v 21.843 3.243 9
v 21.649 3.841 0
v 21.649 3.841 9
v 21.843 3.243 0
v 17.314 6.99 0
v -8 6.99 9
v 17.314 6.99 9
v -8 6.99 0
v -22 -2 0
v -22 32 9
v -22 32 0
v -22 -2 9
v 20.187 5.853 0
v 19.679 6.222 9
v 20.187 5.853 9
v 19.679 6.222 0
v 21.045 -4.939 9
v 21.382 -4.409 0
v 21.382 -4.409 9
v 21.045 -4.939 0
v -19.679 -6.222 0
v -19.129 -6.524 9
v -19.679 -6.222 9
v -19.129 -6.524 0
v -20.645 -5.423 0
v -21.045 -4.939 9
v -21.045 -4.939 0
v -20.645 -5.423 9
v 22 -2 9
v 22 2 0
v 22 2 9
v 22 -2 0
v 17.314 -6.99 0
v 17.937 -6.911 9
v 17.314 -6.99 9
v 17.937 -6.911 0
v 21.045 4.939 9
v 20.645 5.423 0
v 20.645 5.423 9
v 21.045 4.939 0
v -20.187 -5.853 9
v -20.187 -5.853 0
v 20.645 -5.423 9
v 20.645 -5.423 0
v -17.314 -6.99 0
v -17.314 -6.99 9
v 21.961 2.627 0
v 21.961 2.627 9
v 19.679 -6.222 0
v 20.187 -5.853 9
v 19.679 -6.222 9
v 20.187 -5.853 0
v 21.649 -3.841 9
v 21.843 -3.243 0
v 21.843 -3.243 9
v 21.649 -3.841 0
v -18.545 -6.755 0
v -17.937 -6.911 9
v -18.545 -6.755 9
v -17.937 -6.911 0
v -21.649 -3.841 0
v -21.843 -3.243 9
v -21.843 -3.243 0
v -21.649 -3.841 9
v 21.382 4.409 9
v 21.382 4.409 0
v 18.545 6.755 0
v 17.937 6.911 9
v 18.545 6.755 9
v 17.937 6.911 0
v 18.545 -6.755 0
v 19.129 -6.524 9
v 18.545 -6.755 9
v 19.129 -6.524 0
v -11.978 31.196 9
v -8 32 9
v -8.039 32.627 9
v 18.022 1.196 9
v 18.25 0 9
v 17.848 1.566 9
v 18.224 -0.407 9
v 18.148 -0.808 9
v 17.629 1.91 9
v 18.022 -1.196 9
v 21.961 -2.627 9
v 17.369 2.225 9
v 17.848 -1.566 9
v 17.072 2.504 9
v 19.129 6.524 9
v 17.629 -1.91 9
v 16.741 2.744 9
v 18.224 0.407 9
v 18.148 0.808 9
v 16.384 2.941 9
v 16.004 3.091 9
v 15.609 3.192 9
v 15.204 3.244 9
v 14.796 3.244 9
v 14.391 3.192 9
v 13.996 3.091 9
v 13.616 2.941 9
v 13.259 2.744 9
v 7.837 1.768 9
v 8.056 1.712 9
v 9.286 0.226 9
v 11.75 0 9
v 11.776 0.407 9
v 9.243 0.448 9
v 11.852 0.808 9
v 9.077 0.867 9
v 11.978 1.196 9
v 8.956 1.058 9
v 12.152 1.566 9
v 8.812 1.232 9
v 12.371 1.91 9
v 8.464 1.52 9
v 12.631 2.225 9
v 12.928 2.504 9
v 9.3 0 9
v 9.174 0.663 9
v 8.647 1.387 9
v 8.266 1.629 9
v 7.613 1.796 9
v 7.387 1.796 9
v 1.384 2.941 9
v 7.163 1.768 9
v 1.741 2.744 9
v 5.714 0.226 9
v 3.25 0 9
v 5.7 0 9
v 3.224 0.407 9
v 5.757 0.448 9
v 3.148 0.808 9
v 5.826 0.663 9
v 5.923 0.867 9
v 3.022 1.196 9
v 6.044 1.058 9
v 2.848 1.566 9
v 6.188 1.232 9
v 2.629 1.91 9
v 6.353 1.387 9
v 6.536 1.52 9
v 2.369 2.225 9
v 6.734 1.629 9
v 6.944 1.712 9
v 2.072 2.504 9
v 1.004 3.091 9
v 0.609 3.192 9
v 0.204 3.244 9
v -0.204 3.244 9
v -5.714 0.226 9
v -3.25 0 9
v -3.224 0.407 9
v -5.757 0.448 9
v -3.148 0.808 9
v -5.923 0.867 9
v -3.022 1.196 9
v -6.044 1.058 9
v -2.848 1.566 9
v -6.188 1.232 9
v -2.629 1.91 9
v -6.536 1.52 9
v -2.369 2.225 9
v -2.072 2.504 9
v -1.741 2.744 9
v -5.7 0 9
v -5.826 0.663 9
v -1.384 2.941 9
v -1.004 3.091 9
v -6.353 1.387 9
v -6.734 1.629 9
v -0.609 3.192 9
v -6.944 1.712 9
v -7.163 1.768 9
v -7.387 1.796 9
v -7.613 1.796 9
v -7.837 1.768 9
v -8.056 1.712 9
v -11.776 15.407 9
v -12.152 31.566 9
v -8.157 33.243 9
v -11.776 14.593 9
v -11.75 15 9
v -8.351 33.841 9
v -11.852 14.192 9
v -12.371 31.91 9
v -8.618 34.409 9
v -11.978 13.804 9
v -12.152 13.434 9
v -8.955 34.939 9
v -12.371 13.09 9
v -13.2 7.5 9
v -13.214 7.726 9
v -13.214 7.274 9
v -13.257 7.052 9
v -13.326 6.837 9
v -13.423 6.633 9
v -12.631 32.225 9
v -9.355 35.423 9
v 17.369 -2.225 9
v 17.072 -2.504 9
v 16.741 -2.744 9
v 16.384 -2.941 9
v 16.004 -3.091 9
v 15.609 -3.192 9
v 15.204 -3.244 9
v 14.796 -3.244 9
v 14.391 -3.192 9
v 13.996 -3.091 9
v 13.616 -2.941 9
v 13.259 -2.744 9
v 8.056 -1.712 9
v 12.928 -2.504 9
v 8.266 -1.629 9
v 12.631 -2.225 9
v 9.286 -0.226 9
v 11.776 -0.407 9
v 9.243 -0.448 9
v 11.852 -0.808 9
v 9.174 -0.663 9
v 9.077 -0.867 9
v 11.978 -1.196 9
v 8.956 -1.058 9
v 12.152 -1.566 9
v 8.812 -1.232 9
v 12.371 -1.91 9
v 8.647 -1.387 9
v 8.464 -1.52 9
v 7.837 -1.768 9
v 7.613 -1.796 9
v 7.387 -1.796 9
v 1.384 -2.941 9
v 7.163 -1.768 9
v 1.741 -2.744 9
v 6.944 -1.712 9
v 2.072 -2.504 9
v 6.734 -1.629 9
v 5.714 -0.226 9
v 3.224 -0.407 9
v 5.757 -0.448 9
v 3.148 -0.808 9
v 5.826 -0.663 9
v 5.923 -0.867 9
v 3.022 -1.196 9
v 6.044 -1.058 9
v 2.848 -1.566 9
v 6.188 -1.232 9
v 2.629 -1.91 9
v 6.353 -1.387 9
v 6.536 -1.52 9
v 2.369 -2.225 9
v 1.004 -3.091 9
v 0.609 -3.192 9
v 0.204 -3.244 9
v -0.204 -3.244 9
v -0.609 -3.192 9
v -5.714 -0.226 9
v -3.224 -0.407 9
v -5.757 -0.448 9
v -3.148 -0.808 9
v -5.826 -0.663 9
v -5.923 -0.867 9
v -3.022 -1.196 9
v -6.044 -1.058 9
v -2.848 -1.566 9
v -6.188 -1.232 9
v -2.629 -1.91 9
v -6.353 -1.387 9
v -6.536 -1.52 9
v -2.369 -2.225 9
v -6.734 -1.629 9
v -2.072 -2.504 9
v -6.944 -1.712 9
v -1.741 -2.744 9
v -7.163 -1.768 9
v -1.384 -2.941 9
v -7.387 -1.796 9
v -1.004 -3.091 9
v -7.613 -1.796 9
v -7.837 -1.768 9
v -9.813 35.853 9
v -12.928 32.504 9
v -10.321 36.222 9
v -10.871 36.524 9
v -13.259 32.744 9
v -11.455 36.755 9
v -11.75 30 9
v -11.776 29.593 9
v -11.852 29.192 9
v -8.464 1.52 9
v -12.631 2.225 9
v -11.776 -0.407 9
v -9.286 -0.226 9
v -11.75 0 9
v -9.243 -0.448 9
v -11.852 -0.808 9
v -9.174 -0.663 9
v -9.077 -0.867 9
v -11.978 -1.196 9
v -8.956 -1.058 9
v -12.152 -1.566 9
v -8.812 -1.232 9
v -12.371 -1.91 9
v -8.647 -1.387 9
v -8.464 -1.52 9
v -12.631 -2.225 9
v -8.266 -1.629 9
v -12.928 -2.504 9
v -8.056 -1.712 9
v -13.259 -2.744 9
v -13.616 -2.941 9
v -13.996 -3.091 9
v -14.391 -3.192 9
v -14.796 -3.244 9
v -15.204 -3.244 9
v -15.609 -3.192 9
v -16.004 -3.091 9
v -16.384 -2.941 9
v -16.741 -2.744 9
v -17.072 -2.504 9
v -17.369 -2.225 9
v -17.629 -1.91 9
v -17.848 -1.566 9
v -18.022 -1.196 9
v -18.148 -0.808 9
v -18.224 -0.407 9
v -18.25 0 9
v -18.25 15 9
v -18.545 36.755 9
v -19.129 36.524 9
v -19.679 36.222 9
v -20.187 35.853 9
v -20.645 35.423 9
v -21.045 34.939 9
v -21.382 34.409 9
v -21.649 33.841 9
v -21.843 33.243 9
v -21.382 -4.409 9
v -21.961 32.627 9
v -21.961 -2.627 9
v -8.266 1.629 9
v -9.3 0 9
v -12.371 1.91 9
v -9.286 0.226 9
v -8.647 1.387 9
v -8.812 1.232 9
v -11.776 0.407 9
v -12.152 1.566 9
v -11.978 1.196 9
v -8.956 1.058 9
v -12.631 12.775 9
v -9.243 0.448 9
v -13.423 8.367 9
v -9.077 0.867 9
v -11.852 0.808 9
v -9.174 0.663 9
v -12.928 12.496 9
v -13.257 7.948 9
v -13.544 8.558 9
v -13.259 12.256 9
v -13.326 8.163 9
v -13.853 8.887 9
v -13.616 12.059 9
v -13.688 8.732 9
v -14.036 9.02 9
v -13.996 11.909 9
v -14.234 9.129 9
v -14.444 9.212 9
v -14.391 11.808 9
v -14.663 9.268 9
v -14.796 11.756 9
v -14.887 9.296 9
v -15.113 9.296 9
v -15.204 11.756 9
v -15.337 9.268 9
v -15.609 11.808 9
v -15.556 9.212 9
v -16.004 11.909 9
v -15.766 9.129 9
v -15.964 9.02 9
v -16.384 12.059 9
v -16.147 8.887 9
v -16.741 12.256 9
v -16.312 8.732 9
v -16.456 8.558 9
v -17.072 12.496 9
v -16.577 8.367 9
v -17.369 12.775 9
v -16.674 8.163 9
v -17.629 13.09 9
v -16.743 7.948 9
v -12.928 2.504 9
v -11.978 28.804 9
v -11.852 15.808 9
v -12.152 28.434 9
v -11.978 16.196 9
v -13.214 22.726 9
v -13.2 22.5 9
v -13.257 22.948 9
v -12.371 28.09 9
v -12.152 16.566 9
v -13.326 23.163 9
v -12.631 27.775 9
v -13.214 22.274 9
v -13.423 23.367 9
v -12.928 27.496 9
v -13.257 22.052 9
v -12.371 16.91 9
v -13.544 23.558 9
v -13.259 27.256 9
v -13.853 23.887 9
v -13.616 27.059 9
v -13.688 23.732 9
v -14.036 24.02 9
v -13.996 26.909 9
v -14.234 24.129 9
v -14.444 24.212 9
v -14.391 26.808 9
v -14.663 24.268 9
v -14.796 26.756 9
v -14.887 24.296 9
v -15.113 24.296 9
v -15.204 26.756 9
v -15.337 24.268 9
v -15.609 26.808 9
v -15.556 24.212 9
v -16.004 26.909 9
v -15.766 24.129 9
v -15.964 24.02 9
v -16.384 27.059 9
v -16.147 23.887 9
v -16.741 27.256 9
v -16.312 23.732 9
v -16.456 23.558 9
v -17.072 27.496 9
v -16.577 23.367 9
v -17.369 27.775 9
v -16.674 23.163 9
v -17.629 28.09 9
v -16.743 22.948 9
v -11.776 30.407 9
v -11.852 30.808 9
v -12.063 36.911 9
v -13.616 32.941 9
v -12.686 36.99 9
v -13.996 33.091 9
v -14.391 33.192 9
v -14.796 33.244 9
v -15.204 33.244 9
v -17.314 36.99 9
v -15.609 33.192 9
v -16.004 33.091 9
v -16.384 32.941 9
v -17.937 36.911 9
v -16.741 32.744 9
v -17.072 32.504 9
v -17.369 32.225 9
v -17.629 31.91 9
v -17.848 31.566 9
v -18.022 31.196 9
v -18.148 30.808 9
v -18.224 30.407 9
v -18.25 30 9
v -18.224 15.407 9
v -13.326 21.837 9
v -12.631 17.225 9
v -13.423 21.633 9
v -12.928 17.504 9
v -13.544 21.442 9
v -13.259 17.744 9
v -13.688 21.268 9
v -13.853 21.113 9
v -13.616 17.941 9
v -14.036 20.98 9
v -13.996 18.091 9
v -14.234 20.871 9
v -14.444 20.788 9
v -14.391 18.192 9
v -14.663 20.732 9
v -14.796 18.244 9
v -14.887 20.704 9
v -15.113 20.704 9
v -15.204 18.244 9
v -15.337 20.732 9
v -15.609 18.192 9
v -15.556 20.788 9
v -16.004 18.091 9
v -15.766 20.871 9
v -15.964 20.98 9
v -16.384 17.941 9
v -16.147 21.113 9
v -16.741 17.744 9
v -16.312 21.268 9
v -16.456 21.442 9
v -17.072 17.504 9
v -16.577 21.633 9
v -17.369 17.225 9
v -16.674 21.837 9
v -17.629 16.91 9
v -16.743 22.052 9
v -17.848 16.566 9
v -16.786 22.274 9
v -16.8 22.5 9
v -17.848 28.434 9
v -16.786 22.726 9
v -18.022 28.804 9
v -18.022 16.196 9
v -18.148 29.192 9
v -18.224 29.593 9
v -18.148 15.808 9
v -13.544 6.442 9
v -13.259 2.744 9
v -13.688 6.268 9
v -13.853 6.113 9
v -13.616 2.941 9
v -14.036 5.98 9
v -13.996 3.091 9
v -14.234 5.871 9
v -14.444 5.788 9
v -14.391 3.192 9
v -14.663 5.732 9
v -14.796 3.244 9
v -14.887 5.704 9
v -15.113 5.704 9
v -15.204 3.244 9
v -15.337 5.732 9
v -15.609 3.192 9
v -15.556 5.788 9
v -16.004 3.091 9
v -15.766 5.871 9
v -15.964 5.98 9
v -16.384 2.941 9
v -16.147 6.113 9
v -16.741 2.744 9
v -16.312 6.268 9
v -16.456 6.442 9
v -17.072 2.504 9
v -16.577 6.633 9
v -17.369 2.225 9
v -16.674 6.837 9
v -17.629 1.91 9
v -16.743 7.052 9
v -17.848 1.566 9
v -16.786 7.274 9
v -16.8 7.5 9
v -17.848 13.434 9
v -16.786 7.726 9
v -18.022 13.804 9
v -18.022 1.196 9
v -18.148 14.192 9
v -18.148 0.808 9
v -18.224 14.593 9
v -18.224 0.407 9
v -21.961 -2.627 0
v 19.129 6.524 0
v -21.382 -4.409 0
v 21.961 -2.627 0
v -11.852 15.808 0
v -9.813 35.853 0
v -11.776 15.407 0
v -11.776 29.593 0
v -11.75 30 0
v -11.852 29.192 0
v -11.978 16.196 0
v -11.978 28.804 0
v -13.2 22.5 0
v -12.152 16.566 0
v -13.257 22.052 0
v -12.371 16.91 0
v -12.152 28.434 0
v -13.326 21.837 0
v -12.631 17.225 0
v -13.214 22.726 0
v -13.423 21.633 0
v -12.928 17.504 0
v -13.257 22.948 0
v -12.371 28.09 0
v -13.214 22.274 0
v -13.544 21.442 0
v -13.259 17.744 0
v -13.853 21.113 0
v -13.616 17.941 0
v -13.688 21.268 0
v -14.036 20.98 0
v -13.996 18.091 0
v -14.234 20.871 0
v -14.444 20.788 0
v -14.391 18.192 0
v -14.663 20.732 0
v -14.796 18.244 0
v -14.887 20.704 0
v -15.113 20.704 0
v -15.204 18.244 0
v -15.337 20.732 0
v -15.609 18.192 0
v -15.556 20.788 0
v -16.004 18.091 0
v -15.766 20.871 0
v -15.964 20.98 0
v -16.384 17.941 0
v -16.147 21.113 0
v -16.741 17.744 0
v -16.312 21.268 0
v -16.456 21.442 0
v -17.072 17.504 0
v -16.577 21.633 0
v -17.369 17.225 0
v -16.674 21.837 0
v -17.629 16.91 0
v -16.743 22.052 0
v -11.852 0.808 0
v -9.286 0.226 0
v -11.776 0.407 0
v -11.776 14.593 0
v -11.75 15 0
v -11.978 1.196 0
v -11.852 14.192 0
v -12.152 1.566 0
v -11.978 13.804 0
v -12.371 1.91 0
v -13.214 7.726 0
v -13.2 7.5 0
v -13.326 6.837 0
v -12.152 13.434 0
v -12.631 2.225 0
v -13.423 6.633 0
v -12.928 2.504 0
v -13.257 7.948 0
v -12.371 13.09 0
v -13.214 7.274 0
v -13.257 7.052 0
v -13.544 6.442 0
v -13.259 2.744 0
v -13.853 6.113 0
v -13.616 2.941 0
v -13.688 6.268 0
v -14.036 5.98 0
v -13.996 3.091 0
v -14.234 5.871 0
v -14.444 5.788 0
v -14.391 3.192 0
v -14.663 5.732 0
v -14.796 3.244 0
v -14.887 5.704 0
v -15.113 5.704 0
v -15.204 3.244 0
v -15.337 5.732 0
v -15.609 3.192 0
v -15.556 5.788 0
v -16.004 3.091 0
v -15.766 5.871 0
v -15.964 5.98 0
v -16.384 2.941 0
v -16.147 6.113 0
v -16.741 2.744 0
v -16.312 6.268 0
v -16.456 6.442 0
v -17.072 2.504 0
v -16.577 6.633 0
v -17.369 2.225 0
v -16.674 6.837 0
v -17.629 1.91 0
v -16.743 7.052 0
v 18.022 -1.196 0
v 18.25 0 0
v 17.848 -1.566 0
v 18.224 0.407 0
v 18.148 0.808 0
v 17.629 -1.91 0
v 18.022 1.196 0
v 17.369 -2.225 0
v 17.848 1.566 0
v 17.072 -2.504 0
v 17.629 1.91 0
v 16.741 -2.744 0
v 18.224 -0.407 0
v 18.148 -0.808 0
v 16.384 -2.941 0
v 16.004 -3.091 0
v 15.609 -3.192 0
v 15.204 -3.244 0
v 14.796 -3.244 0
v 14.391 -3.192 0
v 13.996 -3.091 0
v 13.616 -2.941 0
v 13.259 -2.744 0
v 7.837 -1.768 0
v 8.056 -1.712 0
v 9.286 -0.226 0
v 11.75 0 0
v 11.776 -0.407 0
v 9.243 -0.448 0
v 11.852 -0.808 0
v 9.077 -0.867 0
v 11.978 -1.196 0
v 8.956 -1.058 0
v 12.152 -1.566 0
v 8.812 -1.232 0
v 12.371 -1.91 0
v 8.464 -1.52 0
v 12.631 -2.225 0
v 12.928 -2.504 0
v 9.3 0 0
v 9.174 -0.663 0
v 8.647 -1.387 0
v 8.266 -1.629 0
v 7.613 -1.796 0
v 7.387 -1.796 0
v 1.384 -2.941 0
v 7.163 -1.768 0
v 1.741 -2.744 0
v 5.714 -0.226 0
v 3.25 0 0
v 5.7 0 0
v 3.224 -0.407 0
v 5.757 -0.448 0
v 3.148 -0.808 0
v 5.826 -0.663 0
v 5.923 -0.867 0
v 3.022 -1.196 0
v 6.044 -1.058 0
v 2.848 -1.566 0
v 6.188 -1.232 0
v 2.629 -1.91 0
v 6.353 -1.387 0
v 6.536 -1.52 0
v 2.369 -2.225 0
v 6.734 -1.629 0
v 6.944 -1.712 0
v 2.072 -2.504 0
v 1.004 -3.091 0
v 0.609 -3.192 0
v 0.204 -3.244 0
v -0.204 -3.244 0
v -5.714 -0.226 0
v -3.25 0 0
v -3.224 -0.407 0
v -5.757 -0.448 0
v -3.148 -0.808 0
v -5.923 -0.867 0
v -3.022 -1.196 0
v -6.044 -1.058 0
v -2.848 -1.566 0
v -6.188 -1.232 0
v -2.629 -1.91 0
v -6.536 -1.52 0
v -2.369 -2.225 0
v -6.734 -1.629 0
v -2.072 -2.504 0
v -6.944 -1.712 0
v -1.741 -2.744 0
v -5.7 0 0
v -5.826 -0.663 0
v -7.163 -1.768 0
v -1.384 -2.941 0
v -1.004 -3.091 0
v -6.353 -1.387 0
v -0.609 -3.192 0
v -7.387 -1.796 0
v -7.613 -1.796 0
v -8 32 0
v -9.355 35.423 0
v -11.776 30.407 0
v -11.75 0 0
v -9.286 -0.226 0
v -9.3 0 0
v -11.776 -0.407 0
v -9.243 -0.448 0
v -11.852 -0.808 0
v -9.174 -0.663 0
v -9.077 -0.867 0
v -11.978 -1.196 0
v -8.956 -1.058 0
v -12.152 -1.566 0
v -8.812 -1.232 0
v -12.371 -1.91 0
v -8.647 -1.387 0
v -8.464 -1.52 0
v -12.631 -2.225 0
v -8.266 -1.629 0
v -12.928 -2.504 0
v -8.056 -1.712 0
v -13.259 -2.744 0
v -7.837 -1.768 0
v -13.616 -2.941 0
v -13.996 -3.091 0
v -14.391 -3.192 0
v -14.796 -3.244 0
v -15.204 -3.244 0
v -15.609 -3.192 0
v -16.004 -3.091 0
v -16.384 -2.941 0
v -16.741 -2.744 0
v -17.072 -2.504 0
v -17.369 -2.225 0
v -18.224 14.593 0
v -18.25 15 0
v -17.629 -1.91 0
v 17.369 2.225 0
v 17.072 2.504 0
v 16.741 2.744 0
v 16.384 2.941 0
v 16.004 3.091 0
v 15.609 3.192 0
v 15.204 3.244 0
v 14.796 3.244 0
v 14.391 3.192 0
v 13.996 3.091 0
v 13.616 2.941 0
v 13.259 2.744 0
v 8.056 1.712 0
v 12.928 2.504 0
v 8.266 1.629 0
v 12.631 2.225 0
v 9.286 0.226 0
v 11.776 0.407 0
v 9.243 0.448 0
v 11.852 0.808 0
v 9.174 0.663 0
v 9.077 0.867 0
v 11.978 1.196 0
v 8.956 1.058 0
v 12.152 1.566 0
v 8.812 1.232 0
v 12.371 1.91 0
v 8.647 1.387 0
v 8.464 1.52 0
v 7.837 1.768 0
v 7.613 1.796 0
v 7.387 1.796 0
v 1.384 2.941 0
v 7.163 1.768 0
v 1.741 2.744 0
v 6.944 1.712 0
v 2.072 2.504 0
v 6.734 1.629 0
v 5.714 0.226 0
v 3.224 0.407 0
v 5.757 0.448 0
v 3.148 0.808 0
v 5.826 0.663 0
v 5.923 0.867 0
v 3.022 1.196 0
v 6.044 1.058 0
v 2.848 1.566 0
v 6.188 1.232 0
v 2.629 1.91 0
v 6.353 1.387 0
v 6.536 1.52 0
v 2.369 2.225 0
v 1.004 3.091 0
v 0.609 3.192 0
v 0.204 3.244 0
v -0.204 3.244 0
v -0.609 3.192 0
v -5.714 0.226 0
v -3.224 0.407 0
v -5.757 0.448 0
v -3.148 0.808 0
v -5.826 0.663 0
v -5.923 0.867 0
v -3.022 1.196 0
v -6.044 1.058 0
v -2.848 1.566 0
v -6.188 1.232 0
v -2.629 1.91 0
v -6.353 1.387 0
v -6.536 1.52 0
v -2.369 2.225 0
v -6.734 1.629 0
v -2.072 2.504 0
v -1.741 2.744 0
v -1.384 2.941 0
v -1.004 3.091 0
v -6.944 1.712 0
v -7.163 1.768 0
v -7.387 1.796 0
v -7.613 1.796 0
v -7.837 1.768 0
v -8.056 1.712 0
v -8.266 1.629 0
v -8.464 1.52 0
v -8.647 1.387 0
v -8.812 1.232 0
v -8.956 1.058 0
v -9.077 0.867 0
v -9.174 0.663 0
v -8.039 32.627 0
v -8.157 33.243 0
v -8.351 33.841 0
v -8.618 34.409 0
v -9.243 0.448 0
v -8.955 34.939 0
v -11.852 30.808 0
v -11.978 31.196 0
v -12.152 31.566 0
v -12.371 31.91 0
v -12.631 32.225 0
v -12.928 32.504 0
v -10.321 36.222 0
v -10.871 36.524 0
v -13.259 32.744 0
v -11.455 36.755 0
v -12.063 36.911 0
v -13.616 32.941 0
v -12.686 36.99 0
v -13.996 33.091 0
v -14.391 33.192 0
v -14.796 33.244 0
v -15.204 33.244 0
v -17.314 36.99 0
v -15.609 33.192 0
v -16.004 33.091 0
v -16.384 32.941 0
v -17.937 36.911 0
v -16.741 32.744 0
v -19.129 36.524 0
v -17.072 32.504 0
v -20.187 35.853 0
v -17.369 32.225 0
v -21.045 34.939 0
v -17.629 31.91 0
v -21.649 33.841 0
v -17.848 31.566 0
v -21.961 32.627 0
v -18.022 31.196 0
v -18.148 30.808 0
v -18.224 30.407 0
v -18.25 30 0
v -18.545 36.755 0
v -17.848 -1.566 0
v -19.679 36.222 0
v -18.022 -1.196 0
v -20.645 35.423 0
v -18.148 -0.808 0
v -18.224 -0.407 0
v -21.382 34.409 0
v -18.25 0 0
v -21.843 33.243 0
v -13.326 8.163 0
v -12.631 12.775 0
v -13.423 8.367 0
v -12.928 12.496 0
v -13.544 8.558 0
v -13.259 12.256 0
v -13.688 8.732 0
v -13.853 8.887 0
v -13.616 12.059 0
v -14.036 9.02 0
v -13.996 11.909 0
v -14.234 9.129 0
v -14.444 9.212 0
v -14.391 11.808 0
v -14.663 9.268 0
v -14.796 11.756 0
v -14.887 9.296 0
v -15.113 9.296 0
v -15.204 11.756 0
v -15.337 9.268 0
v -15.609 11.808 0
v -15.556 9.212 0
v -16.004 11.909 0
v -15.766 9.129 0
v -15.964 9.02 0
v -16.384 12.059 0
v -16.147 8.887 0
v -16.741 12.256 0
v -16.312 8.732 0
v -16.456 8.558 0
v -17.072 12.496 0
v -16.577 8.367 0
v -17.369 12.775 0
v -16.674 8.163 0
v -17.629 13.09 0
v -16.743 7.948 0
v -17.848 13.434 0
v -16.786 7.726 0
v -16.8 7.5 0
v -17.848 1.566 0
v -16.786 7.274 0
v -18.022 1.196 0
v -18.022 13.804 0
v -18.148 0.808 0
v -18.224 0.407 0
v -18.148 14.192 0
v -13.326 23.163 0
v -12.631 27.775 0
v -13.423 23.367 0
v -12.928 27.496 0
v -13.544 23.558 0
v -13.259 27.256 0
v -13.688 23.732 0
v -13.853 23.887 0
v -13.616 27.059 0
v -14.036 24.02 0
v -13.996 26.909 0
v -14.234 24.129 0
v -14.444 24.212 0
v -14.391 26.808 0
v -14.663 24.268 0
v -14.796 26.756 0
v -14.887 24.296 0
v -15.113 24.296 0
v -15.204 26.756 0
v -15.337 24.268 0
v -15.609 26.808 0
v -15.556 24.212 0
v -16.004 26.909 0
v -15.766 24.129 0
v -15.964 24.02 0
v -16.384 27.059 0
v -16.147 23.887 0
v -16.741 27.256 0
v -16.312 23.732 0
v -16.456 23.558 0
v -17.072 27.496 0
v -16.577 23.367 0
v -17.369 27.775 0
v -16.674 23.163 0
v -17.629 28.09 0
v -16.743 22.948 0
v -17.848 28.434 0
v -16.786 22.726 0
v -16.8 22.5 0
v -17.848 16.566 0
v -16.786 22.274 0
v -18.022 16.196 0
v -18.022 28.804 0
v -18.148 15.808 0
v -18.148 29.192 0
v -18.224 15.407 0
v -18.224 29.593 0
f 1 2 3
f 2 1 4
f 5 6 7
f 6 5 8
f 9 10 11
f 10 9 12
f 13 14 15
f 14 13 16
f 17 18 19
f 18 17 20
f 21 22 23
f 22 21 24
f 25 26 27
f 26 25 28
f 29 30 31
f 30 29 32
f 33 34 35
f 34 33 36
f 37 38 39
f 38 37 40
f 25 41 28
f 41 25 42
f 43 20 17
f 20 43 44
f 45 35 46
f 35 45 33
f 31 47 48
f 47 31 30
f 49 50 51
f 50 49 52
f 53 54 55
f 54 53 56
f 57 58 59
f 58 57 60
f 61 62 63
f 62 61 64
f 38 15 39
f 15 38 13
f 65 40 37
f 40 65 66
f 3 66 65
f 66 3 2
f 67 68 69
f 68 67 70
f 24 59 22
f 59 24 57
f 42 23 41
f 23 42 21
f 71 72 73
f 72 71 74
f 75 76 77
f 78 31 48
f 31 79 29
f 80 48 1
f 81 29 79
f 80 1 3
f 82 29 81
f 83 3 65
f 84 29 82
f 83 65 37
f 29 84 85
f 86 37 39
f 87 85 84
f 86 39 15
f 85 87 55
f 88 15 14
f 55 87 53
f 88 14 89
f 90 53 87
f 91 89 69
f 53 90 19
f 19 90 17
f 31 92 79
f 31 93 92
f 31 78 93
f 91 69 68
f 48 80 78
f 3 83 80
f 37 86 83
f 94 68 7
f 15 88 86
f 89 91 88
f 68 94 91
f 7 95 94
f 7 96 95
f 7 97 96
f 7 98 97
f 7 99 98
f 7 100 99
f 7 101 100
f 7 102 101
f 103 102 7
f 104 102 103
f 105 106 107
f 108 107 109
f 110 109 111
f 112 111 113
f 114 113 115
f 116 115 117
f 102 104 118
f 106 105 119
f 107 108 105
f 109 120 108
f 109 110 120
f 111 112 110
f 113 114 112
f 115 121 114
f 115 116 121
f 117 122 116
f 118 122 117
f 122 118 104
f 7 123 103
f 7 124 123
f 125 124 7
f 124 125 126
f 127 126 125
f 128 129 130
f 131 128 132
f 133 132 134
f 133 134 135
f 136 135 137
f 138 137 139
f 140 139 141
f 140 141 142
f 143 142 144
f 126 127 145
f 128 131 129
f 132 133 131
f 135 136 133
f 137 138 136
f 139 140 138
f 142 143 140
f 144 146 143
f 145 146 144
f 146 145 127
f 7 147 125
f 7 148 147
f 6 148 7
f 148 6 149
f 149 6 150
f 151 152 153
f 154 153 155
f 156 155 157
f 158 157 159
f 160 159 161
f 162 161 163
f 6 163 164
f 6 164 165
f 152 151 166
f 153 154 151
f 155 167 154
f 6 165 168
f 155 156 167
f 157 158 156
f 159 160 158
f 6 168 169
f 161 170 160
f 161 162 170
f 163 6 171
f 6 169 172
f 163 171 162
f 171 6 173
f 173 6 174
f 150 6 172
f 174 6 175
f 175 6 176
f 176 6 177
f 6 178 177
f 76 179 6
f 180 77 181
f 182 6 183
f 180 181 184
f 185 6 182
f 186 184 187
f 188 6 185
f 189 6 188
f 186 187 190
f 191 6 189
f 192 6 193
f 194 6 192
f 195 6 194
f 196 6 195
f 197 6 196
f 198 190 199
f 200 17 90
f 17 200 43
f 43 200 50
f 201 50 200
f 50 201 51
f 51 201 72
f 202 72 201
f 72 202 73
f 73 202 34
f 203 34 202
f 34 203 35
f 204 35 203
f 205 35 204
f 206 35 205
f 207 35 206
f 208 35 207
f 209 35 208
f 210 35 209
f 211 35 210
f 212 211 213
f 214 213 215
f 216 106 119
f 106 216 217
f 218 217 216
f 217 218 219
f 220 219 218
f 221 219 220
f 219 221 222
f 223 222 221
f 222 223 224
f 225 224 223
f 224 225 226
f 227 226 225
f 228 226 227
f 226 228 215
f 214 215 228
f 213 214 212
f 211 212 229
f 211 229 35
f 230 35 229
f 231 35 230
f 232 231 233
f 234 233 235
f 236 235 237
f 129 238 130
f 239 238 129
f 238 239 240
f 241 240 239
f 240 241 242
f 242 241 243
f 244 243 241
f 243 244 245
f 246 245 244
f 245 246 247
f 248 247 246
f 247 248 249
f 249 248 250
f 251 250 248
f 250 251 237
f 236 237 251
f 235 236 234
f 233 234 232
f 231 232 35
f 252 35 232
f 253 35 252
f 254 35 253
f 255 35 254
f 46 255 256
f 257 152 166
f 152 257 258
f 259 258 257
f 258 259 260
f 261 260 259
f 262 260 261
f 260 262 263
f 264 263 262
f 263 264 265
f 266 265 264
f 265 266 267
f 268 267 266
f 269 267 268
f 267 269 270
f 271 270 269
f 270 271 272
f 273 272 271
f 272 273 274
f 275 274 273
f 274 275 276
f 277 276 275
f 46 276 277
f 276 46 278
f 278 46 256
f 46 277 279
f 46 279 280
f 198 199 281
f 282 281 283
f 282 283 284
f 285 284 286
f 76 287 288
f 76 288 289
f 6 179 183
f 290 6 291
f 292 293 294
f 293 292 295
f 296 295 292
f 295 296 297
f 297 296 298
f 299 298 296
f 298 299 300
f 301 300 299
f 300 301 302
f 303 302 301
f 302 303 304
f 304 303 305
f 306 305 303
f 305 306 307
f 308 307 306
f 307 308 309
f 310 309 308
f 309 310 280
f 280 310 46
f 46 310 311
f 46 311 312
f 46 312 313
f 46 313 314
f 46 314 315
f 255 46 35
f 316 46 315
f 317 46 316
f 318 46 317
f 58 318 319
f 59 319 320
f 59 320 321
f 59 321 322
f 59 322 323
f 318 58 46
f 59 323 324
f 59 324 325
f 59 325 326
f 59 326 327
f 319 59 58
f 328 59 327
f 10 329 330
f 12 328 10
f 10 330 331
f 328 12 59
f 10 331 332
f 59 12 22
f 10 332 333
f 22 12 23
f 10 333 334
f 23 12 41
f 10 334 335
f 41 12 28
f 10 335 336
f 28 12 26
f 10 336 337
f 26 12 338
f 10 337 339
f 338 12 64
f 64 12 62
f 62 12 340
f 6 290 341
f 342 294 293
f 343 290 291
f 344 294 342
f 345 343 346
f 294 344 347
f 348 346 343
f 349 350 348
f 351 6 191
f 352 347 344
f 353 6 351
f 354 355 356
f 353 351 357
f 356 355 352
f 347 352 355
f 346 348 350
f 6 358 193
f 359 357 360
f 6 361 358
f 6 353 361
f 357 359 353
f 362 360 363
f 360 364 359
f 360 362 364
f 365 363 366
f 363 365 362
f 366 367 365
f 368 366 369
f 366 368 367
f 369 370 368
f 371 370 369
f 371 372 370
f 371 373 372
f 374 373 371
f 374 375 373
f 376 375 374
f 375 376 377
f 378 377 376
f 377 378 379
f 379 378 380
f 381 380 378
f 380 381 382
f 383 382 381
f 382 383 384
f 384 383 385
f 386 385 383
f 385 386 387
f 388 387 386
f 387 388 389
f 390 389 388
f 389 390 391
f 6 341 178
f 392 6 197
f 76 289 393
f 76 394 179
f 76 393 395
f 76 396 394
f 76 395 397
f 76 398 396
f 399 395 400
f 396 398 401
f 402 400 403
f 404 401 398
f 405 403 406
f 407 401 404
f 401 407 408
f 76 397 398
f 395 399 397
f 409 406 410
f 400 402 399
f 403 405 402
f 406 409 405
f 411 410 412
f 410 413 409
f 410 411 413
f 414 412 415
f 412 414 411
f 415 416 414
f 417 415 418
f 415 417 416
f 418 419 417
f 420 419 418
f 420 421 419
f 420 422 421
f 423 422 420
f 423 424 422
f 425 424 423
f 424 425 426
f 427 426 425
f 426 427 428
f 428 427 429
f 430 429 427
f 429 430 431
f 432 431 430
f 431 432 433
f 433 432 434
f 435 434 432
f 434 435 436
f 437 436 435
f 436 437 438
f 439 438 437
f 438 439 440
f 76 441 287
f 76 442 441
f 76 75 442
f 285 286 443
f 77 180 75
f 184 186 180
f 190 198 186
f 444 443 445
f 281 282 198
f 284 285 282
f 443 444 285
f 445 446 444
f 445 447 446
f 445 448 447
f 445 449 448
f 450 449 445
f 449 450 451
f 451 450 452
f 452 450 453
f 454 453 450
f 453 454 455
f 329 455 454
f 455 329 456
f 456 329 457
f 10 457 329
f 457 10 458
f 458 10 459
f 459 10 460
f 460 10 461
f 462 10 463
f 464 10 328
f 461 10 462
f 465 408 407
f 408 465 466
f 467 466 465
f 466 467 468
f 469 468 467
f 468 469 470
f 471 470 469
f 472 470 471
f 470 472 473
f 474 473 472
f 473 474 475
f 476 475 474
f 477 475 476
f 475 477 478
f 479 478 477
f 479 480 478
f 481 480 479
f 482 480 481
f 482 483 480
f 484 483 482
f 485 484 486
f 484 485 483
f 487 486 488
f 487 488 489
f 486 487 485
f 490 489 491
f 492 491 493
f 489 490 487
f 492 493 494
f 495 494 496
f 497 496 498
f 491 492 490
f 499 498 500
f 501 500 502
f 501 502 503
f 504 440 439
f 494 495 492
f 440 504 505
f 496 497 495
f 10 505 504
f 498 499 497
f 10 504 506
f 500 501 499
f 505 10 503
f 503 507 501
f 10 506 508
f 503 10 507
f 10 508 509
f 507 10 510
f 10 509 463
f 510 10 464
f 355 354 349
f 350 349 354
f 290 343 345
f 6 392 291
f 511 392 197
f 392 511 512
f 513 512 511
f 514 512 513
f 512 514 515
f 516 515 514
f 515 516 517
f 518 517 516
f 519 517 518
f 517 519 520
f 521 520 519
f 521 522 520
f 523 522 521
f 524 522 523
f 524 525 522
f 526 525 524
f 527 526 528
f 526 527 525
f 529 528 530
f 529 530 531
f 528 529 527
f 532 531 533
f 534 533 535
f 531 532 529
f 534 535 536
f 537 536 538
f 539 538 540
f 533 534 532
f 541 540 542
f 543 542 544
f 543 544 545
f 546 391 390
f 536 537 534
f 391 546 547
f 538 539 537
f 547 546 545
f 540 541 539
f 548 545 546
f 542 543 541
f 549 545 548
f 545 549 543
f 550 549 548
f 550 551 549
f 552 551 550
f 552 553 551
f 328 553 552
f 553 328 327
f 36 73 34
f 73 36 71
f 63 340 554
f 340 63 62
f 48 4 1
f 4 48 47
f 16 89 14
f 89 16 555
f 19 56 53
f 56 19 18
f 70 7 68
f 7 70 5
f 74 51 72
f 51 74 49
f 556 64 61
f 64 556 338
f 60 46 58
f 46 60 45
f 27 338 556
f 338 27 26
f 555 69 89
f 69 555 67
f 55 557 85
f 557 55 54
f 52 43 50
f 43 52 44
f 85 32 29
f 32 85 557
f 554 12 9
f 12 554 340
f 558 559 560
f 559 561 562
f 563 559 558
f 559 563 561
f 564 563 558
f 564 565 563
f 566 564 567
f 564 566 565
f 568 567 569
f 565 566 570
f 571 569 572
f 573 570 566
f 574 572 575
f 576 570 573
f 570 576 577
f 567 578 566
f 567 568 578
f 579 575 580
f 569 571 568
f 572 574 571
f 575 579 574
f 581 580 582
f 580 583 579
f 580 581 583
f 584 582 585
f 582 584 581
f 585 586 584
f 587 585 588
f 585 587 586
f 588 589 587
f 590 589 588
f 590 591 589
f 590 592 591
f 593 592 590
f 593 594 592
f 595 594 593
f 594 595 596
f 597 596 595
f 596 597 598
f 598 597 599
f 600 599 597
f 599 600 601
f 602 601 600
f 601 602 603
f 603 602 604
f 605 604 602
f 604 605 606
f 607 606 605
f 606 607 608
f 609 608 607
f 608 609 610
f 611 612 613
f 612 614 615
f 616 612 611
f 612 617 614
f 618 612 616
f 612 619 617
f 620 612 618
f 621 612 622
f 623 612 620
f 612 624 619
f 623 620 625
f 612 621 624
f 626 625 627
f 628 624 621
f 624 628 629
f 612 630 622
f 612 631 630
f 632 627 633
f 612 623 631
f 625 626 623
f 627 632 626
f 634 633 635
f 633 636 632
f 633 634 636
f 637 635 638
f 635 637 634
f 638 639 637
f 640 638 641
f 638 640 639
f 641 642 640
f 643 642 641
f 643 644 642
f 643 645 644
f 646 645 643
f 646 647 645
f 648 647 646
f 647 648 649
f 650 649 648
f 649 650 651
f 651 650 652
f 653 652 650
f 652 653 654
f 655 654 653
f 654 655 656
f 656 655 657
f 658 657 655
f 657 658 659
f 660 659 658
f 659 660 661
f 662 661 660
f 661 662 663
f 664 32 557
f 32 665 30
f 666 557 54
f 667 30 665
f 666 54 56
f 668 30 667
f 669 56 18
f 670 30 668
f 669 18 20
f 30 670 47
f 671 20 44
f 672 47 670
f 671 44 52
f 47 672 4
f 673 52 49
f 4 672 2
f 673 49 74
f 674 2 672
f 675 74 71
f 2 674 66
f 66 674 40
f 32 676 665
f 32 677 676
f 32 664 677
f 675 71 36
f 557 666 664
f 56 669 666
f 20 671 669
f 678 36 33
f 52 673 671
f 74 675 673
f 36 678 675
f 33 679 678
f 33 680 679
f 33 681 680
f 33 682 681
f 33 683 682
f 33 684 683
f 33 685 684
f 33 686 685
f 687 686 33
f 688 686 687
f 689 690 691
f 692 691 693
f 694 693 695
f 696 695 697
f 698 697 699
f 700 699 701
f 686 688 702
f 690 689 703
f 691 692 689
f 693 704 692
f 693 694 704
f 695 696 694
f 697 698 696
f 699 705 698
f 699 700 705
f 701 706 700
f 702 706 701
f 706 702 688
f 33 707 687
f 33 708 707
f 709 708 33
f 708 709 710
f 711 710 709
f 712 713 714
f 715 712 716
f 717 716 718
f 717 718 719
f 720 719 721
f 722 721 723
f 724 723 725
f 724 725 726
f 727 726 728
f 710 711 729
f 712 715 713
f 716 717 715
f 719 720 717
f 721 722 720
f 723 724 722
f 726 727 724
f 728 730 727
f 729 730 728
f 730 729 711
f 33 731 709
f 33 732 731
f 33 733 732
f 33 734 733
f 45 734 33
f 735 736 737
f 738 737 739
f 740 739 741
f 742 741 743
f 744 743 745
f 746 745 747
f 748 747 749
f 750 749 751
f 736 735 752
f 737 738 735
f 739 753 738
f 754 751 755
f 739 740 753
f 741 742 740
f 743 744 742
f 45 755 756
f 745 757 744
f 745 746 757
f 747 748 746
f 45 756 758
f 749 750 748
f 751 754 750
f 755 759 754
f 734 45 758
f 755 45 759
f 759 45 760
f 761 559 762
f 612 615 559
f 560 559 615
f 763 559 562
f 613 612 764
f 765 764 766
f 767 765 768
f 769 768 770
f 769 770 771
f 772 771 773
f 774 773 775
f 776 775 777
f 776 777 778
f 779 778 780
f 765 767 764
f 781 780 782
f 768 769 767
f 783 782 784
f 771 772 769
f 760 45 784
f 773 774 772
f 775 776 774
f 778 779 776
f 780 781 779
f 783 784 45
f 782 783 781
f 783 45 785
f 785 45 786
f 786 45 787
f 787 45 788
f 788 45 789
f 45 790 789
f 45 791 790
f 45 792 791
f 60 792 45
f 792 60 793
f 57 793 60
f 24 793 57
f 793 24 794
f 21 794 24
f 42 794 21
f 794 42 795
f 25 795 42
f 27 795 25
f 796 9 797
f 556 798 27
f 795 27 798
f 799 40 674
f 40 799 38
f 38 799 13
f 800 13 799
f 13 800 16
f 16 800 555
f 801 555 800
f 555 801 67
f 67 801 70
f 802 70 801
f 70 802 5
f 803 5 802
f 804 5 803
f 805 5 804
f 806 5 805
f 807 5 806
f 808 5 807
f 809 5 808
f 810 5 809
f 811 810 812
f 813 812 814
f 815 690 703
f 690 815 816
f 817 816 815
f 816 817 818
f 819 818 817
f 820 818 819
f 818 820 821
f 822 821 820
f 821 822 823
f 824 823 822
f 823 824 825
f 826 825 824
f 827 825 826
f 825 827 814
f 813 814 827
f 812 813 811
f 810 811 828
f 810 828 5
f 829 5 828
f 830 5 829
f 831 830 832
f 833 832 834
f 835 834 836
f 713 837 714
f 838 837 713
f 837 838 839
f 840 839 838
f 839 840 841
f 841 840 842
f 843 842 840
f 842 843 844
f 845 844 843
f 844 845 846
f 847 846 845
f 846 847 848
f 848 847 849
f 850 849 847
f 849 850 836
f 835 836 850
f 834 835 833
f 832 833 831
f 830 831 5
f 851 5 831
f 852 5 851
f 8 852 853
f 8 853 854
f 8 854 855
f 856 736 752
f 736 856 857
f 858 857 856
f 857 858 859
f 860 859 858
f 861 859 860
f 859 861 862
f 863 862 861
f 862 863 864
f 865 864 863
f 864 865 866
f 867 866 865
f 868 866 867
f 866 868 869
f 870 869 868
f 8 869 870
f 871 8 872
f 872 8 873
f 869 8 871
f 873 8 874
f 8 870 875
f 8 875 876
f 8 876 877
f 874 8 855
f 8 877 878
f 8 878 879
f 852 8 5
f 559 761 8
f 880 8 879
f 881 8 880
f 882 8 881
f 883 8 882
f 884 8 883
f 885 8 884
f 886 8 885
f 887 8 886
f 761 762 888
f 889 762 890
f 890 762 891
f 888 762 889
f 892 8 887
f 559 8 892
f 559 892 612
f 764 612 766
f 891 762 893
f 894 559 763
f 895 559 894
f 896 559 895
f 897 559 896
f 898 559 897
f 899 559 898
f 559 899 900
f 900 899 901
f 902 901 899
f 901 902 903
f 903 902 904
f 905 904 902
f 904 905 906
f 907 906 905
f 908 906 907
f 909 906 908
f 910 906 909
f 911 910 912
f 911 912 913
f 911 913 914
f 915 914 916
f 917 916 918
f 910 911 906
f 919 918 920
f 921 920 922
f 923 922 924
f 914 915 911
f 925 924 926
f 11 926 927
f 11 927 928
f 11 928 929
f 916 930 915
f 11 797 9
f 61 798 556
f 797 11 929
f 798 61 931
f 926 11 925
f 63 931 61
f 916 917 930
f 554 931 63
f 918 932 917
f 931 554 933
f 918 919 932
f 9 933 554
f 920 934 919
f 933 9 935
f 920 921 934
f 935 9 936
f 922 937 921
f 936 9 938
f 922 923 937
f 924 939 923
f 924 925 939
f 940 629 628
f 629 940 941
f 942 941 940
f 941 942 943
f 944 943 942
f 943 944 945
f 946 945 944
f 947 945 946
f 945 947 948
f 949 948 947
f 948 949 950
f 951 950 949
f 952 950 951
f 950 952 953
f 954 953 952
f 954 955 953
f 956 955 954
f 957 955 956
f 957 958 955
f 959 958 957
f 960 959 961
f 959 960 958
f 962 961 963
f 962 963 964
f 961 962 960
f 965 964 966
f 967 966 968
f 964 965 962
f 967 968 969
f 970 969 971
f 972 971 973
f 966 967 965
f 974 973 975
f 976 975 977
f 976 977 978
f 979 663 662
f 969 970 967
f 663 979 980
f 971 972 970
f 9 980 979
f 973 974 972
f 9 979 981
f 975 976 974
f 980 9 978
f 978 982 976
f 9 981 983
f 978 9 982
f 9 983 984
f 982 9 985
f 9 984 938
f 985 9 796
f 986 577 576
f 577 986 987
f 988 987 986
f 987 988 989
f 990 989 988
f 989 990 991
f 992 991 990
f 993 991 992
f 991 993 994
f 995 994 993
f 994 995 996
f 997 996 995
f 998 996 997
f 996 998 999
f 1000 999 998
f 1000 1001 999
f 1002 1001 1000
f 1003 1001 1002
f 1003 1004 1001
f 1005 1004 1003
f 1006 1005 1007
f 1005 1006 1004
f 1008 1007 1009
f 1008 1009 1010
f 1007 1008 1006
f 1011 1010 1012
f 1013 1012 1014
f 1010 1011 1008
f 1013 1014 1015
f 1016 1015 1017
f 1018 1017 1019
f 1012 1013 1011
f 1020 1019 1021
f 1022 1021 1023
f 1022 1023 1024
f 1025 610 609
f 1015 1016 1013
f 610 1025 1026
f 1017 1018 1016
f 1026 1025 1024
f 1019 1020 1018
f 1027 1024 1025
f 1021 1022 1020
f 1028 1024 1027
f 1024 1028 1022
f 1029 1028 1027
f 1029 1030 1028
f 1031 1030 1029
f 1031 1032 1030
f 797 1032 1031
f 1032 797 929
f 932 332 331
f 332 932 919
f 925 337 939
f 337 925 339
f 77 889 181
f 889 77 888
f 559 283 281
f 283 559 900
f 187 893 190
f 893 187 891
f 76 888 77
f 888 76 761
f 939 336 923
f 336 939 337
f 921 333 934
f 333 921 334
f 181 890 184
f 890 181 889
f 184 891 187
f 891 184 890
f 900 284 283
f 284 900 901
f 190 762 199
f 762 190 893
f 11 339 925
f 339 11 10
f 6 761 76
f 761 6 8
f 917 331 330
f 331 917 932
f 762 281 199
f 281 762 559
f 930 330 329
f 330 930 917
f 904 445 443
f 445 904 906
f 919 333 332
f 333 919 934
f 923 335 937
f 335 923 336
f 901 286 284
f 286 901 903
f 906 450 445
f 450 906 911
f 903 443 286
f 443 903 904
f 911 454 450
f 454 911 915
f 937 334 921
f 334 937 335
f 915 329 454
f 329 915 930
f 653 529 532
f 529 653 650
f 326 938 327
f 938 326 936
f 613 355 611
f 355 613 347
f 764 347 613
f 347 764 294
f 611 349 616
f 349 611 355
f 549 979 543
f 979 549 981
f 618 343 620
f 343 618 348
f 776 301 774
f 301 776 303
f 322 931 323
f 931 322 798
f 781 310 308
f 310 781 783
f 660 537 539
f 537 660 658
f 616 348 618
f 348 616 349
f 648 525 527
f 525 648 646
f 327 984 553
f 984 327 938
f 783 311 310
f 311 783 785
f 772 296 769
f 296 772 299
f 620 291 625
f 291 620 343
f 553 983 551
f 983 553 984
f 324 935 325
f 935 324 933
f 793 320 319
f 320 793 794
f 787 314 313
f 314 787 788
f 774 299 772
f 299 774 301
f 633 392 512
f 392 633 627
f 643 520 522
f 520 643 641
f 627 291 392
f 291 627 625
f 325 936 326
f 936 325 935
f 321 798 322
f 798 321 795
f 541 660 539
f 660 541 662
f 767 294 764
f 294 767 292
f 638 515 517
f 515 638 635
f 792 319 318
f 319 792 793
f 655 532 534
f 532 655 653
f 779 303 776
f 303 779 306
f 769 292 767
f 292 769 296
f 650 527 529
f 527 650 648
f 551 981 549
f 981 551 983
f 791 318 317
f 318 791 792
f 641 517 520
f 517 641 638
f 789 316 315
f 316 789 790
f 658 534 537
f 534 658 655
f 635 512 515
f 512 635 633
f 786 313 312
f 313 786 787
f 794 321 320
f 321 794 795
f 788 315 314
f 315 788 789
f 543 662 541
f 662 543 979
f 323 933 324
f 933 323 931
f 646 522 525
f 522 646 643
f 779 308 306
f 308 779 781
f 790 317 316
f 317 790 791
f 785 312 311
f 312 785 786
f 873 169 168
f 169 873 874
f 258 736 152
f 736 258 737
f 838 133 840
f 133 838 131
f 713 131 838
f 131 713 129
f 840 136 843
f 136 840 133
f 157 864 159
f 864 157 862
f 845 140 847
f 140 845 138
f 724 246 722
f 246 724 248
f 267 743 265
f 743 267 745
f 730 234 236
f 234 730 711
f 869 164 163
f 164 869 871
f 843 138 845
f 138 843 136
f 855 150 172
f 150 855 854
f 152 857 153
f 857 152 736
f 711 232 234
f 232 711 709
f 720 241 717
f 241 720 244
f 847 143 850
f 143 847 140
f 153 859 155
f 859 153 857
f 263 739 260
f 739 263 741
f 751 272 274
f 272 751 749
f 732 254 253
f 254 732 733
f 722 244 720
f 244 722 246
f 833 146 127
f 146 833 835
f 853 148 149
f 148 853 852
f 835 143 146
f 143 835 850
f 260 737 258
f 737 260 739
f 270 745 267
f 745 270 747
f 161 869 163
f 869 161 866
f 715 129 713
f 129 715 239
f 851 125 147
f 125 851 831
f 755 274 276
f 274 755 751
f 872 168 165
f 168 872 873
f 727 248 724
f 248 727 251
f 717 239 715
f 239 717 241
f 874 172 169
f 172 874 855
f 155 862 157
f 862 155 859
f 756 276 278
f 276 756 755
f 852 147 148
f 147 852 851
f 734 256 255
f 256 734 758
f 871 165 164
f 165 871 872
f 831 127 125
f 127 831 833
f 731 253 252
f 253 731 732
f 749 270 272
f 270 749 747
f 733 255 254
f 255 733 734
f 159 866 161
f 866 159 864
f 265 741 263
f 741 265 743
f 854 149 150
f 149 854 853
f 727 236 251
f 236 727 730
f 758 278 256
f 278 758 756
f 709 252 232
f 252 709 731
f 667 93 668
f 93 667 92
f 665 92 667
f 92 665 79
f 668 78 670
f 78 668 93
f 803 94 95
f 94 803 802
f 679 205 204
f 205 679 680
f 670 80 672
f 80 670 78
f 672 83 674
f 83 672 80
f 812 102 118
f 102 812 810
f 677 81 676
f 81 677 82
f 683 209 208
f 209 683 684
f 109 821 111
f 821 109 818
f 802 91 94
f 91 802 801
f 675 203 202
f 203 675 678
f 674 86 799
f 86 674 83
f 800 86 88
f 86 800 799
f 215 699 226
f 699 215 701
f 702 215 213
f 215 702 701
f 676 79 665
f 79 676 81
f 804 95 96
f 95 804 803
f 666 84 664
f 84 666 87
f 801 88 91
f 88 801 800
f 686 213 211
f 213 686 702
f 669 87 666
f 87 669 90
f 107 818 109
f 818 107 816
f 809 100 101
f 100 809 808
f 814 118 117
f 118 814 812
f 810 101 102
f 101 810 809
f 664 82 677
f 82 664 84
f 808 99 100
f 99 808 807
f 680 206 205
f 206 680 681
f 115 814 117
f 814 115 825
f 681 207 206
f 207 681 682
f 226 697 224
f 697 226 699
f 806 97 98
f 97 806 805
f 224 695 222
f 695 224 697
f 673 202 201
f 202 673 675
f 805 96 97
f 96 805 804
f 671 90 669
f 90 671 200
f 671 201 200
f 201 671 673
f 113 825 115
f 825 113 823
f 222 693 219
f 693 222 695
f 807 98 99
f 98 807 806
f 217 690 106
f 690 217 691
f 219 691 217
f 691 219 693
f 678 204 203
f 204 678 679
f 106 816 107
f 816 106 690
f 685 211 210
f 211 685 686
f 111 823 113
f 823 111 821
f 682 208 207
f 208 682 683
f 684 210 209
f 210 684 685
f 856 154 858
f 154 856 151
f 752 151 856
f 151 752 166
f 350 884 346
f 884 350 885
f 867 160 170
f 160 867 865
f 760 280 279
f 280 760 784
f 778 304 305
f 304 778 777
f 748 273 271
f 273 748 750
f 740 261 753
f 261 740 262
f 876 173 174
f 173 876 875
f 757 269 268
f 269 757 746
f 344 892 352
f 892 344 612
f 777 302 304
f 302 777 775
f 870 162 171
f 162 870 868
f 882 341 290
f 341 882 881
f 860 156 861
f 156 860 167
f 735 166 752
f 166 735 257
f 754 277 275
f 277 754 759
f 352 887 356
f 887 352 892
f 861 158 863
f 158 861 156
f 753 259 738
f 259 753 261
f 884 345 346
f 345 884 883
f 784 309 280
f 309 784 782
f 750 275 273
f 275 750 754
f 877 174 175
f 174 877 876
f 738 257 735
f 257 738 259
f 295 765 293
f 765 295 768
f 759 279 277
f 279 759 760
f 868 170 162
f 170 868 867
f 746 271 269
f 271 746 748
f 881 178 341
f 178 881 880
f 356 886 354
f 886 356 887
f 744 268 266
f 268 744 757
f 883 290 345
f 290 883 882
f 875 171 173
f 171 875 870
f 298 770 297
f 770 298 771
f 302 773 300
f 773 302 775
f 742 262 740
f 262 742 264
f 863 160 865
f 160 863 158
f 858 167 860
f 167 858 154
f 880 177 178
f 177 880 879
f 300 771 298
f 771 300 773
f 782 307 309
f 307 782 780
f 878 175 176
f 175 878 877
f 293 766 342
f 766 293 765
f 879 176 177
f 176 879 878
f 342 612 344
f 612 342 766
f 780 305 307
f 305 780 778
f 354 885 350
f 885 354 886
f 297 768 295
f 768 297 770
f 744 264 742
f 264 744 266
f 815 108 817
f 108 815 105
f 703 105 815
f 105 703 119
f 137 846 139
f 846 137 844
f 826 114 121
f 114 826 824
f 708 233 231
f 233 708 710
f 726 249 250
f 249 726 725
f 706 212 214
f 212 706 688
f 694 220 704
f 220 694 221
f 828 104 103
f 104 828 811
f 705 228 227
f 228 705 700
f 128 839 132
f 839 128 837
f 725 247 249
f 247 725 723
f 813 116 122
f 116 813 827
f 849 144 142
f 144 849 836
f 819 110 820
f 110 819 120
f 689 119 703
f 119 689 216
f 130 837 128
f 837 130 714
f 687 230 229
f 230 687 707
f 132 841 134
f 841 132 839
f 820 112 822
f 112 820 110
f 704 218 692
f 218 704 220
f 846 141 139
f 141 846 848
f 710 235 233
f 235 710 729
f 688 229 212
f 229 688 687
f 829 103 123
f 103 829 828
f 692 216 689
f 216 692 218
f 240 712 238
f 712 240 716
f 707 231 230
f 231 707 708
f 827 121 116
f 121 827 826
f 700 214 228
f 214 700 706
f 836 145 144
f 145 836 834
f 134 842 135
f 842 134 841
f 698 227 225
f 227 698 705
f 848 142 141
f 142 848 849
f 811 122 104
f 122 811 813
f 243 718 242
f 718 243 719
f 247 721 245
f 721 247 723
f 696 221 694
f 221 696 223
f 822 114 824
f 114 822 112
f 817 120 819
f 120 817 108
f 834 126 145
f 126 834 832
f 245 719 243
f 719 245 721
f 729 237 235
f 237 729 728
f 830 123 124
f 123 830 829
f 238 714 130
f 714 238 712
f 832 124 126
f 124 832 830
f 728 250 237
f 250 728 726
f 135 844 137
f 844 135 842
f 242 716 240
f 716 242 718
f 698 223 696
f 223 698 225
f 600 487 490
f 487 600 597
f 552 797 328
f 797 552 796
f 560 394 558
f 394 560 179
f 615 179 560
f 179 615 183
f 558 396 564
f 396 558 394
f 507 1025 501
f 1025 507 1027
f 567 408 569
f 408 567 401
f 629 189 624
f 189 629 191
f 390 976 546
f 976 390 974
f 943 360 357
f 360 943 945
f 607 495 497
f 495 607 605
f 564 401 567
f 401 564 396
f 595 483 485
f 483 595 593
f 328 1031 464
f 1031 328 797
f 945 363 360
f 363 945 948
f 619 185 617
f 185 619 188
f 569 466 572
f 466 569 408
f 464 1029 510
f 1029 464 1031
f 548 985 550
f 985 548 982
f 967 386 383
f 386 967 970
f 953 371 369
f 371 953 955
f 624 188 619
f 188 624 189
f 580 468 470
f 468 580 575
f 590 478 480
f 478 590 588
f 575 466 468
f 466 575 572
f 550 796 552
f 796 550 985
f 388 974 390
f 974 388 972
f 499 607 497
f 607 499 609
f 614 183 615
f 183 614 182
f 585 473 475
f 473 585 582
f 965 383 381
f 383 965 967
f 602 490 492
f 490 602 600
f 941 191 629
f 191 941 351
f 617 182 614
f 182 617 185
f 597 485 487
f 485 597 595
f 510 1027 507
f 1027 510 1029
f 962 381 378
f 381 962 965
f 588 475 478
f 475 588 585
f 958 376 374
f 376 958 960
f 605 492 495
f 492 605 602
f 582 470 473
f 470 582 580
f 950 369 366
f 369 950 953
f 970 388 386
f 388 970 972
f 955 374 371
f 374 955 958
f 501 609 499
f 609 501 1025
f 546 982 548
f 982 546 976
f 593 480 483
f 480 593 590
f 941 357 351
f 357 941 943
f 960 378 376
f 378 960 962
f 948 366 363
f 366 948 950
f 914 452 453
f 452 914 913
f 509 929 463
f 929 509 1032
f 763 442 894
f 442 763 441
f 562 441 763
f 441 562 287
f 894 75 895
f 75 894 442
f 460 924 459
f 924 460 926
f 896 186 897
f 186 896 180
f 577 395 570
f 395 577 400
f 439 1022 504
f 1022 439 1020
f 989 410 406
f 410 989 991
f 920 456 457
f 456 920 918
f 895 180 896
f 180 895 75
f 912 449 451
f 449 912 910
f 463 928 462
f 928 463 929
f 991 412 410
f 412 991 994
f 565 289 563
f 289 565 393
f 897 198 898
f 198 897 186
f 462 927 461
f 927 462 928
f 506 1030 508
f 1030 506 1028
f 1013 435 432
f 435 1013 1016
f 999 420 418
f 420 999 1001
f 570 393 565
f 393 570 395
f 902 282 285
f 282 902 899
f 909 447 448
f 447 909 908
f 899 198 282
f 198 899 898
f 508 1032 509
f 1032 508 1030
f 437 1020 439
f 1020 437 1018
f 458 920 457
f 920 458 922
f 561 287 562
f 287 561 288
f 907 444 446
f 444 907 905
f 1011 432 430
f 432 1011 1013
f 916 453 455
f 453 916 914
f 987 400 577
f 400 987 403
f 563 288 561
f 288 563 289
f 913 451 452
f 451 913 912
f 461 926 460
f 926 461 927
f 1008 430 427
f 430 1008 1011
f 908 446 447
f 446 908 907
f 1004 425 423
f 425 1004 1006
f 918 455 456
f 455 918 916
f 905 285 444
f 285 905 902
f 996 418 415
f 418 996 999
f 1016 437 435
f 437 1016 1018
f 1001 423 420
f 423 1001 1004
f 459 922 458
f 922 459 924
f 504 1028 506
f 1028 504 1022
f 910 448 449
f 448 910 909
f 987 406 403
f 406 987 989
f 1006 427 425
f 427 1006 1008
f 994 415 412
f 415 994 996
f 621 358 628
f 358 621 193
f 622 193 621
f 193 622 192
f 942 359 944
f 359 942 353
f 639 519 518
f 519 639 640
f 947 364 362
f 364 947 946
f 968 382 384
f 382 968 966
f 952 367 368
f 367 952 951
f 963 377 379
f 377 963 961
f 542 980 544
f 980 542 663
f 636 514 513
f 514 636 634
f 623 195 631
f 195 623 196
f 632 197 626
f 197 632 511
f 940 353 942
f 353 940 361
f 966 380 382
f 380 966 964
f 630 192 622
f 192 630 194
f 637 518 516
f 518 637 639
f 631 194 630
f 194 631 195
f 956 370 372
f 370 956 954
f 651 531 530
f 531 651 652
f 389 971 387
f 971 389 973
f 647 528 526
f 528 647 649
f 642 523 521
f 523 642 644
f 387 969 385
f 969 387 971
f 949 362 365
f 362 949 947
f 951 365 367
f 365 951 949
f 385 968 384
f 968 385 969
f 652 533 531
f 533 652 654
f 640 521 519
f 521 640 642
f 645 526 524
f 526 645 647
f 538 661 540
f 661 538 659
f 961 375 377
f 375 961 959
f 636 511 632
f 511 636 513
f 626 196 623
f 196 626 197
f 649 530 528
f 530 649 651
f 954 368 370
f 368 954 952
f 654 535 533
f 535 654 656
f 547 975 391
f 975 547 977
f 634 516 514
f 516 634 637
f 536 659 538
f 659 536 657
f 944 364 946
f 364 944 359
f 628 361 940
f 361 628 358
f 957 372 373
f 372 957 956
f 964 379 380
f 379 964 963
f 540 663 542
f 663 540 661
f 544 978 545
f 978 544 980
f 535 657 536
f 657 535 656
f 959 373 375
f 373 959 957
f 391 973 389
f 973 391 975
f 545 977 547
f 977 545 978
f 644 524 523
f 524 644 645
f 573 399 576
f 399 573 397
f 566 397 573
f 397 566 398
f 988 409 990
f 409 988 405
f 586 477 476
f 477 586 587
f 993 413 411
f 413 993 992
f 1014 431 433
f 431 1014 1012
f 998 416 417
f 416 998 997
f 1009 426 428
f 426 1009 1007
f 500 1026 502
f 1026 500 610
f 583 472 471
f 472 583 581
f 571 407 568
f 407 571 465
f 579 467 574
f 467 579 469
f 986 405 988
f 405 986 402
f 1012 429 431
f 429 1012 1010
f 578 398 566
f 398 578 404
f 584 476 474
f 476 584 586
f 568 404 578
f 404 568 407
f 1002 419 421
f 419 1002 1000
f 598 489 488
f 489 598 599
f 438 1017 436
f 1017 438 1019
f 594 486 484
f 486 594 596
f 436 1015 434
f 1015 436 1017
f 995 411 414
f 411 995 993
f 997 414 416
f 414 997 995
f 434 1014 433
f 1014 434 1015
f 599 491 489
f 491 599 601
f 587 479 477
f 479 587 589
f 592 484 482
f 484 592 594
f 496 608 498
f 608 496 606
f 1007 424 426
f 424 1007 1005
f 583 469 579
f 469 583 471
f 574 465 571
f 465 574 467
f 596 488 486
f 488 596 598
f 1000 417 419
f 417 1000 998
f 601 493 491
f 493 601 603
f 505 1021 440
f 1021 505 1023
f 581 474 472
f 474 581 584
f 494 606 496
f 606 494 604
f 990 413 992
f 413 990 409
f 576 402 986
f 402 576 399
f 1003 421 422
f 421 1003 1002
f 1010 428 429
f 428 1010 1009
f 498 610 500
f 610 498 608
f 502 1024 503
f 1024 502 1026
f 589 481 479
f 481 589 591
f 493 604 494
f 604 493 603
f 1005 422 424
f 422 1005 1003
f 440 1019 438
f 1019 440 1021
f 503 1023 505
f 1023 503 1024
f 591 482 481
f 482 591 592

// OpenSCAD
$fn = 50;


difference() {
	union() {
		*color(alpha = 1.0000000000, c = "gray") {
			translate(v = [0, 7, 0]) {
				linear_extrude(height = 1) {
					text(font = "Arial:style=Bold", halign = "center", size = 4.5000000000, text = "COMMENT plate main", valign = "center");
				}
			}
		}
		hull() {
			translate(v = [-17.0000000000, 2.0000000000, 0]) {
				cylinder(h = 9, r = 5);
			}
			translate(v = [17.0000000000, 2.0000000000, 0]) {
				cylinder(h = 9, r = 5);
			}
			translate(v = [-17.0000000000, -2.0000000000, 0]) {
				cylinder(h = 9, r = 5);
			}
			translate(v = [17.0000000000, -2.0000000000, 0]) {
				cylinder(h = 9, r = 5);
			}
		}
		*color(alpha = 1.0000000000, c = "gray") {
			translate(v = [0, 7, 0]) {
				linear_extrude(height = 1) {
					text(font = "Arial:style=Bold", halign = "center", size = 4.5000000000, text = "COMMENT plate main", valign = "center");
				}
			}
		}
		translate(v = [-15.0000000000, 15.0000000000, 0]) {
			hull() {
				translate(v = [-2.0000000000, 17.0000000000, 0]) {
					cylinder(h = 9, r = 5);
				}
				translate(v = [2.0000000000, 17.0000000000, 0]) {
					cylinder(h = 9, r = 5);
				}
				translate(v = [-2.0000000000, -17.0000000000, 0]) {
					cylinder(h = 9, r = 5);
				}
				translate(v = [2.0000000000, -17.0000000000, 0]) {
					cylinder(h = 9, r = 5);
				}
			}
		}
	}
	union() {
		*color(alpha = 1.0000000000, c = "gray") {
			translate(v = [0, 7, 0]) {
				linear_extrude(height = 1) {
					text(font = "Arial:style=Bold", halign = "center", size = 4.5000000000, text = "COMMENT holes main", valign = "center");
				}
			}
		}
		translate(v = [-15.0000000000, 0.0000000000, 0]) {
			translate(v = [0, 0, -100]) {
				cylinder(h = 200, r = 3.2500000000);
			}
		}
		translate(v = [0, 0, -100]) {
			cylinder(h = 200, r = 3.2500000000);
		}
		translate(v = [15.0000000000, 0.0000000000, 0]) {
			translate(v = [0, 0, -100]) {
				cylinder(h = 200, r = 3.2500000000);
			}
		}
		translate(v = [-15.0000000000, 0.0000000000, 0]) {
			translate(v = [0, 0, -100]) {
				cylinder(h = 200, r = 1.8000000000);
			}
		}
		translate(v = [-7.5000000000, 0.0000000000, 0]) {
			translate(v = [0, 0, -100]) {
				cylinder(h = 200, r = 1.8000000000);
			}
		}
		translate(v = [0, 0, -100]) {
			cylinder(h = 200, r = 1.8000000000);
		}
		translate(v = [7.5000000000, 0.0000000000, 0]) {
			translate(v = [0, 0, -100]) {
				cylinder(h = 200, r = 1.8000000000);
			}
		}
		translate(v = [15.0000000000, 0.0000000000, 0]) {
			translate(v = [0, 0, -100]) {
				cylinder(h = 200, r = 1.8000000000);
			}
		}
		*color(alpha = 1.0000000000, c = "gray") {
			translate(v = [0, 7, 0]) {
				linear_extrude(height = 1) {
					text(font = "Arial:style=Bold", halign = "center", size = 4.5000000000, text = "COMMENT holes main", valign = "center");
				}
			}
		}
		translate(v = [-15.0000000000, 0.0000000000, 0]) {
			translate(v = [0, 0, -100]) {
				cylinder(h = 200, r = 3.2500000000);
			}
		}
		translate(v = [-15.0000000000, 15.0000000000, 0]) {
			translate(v = [0, 0, -100]) {
				cylinder(h = 200, r = 3.2500000000);
			}
		}
		translate(v = [-15.0000000000, 30.0000000000, 0]) {
			translate(v = [0, 0, -100]) {
				cylinder(h = 200, r = 3.2500000000);
			}
		}
		translate(v = [-15.0000000000, 0.0000000000, 0]) {
			translate(v = [0, 0, -100]) {
				cylinder(h = 200, r = 1.8000000000);
			}
		}
		translate(v = [-15.0000000000, 7.5000000000, 0]) {
			translate(v = [0, 0, -100]) {
				cylinder(h = 200, r = 1.8000000000);
			}
		}
		translate(v = [-15.0000000000, 15.0000000000, 0]) {
			translate(v = [0, 0, -100]) {
				cylinder(h = 200, r = 1.8000000000);
			}
		}
		translate(v = [-15.0000000000, 22.5000000000, 0]) {
			translate(v = [0, 0, -100]) {
				cylinder(h = 200, r = 1.8000000000);
			}
		}
		translate(v = [-15.0000000000, 30.0000000000, 0]) {
			translate(v = [0, 0, -100]) {
				cylinder(h = 200, r = 1.8000000000);
			}
		}
	}
}
